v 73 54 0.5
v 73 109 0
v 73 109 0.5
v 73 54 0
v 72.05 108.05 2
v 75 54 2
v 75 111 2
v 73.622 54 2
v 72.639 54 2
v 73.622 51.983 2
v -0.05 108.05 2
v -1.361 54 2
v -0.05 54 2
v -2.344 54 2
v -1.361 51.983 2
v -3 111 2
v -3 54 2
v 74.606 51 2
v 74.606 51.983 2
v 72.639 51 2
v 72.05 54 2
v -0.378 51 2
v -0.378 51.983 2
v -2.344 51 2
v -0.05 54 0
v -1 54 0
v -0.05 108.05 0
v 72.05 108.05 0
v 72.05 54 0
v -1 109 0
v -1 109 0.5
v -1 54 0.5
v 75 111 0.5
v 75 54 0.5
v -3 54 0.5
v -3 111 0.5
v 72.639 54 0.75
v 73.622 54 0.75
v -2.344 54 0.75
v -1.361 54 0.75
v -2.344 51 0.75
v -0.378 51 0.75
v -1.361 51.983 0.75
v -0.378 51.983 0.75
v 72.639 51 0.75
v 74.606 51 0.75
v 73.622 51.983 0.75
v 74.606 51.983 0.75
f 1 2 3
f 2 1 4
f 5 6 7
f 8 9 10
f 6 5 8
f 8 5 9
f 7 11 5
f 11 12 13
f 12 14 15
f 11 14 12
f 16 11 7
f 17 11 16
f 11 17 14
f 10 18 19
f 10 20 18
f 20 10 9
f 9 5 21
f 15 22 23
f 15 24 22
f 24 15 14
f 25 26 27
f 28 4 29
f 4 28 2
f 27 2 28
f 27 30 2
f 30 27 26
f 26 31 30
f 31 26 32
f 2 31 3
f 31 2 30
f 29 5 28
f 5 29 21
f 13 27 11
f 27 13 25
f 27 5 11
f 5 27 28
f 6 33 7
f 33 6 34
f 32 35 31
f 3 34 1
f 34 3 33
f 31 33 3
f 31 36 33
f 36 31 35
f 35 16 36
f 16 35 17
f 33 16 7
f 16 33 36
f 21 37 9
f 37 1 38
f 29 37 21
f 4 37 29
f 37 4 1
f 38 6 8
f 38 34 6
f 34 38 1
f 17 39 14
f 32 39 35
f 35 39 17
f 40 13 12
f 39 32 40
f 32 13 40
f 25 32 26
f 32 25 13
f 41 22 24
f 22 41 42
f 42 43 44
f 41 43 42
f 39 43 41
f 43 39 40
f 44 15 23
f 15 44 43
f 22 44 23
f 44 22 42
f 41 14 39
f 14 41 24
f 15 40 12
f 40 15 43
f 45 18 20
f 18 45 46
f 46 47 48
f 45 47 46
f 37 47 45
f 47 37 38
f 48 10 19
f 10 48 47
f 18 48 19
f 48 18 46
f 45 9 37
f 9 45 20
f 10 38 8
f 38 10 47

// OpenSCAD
// Generated by SolidPython 0.4.8 on 2020-11-30 10:40:59


union() {
	union() {
		difference() {
			union() {
				difference() {
					translate(v = [-1.0000000000, -1.0000000000, 0]) {
						cube(size = [74.0000000000, 110.0000000000, 2]);
					}
					translate(v = [-0.0500000000, -0.0500000000, 0]) {
						cube(size = [72.1000000000, 108.1000000000, 2]);
					}
				}
				translate(v = [0, 0, 0.5000000000]) {
					difference() {
						translate(v = [-3.0000000000, -3.0000000000, 0]) {
							cube(size = [78.0000000000, 114.0000000000, 1.5000000000]);
						}
						translate(v = [-1.0000000000, -1.0000000000, 0]) {
							cube(size = [74.0000000000, 110.0000000000, 1.5000000000]);
						}
					}
				}
			}
			translate(v = [-3.0000000000, -3.0000000000, 0]) {
				cube(size = [78.0000000000, 57.0000000000, 2]);
			}
		}
		translate(v = [-2.3444444444, 51.0000000000, 0]) {
			translate(v = [0, 0, 0.7500000000]) {
				translate(v = [0, 3, 0]) {
					rotate(a = -90) {
						union() {
							translate(v = [2.0166666667, 0, 0]) {
								cube(size = [0.9833333333, 1.9666666667, 1.2500000000]);
							}
							cube(size = [3, 0.9833333333, 1.2500000000]);
						}
					}
				}
			}
		}
	}
	translate(v = [72.6388888889, 51.0000000000, 0]) {
		translate(v = [0, 0, 0.7500000000]) {
			translate(v = [0, 3, 0]) {
				rotate(a = -90) {
					union() {
						translate(v = [2.0166666667, 0, 0]) {
							cube(size = [0.9833333333, 1.9666666667, 1.2500000000]);
						}
						cube(size = [3, 0.9833333333, 1.2500000000]);
					}
				}
			}
		}
	}
}
